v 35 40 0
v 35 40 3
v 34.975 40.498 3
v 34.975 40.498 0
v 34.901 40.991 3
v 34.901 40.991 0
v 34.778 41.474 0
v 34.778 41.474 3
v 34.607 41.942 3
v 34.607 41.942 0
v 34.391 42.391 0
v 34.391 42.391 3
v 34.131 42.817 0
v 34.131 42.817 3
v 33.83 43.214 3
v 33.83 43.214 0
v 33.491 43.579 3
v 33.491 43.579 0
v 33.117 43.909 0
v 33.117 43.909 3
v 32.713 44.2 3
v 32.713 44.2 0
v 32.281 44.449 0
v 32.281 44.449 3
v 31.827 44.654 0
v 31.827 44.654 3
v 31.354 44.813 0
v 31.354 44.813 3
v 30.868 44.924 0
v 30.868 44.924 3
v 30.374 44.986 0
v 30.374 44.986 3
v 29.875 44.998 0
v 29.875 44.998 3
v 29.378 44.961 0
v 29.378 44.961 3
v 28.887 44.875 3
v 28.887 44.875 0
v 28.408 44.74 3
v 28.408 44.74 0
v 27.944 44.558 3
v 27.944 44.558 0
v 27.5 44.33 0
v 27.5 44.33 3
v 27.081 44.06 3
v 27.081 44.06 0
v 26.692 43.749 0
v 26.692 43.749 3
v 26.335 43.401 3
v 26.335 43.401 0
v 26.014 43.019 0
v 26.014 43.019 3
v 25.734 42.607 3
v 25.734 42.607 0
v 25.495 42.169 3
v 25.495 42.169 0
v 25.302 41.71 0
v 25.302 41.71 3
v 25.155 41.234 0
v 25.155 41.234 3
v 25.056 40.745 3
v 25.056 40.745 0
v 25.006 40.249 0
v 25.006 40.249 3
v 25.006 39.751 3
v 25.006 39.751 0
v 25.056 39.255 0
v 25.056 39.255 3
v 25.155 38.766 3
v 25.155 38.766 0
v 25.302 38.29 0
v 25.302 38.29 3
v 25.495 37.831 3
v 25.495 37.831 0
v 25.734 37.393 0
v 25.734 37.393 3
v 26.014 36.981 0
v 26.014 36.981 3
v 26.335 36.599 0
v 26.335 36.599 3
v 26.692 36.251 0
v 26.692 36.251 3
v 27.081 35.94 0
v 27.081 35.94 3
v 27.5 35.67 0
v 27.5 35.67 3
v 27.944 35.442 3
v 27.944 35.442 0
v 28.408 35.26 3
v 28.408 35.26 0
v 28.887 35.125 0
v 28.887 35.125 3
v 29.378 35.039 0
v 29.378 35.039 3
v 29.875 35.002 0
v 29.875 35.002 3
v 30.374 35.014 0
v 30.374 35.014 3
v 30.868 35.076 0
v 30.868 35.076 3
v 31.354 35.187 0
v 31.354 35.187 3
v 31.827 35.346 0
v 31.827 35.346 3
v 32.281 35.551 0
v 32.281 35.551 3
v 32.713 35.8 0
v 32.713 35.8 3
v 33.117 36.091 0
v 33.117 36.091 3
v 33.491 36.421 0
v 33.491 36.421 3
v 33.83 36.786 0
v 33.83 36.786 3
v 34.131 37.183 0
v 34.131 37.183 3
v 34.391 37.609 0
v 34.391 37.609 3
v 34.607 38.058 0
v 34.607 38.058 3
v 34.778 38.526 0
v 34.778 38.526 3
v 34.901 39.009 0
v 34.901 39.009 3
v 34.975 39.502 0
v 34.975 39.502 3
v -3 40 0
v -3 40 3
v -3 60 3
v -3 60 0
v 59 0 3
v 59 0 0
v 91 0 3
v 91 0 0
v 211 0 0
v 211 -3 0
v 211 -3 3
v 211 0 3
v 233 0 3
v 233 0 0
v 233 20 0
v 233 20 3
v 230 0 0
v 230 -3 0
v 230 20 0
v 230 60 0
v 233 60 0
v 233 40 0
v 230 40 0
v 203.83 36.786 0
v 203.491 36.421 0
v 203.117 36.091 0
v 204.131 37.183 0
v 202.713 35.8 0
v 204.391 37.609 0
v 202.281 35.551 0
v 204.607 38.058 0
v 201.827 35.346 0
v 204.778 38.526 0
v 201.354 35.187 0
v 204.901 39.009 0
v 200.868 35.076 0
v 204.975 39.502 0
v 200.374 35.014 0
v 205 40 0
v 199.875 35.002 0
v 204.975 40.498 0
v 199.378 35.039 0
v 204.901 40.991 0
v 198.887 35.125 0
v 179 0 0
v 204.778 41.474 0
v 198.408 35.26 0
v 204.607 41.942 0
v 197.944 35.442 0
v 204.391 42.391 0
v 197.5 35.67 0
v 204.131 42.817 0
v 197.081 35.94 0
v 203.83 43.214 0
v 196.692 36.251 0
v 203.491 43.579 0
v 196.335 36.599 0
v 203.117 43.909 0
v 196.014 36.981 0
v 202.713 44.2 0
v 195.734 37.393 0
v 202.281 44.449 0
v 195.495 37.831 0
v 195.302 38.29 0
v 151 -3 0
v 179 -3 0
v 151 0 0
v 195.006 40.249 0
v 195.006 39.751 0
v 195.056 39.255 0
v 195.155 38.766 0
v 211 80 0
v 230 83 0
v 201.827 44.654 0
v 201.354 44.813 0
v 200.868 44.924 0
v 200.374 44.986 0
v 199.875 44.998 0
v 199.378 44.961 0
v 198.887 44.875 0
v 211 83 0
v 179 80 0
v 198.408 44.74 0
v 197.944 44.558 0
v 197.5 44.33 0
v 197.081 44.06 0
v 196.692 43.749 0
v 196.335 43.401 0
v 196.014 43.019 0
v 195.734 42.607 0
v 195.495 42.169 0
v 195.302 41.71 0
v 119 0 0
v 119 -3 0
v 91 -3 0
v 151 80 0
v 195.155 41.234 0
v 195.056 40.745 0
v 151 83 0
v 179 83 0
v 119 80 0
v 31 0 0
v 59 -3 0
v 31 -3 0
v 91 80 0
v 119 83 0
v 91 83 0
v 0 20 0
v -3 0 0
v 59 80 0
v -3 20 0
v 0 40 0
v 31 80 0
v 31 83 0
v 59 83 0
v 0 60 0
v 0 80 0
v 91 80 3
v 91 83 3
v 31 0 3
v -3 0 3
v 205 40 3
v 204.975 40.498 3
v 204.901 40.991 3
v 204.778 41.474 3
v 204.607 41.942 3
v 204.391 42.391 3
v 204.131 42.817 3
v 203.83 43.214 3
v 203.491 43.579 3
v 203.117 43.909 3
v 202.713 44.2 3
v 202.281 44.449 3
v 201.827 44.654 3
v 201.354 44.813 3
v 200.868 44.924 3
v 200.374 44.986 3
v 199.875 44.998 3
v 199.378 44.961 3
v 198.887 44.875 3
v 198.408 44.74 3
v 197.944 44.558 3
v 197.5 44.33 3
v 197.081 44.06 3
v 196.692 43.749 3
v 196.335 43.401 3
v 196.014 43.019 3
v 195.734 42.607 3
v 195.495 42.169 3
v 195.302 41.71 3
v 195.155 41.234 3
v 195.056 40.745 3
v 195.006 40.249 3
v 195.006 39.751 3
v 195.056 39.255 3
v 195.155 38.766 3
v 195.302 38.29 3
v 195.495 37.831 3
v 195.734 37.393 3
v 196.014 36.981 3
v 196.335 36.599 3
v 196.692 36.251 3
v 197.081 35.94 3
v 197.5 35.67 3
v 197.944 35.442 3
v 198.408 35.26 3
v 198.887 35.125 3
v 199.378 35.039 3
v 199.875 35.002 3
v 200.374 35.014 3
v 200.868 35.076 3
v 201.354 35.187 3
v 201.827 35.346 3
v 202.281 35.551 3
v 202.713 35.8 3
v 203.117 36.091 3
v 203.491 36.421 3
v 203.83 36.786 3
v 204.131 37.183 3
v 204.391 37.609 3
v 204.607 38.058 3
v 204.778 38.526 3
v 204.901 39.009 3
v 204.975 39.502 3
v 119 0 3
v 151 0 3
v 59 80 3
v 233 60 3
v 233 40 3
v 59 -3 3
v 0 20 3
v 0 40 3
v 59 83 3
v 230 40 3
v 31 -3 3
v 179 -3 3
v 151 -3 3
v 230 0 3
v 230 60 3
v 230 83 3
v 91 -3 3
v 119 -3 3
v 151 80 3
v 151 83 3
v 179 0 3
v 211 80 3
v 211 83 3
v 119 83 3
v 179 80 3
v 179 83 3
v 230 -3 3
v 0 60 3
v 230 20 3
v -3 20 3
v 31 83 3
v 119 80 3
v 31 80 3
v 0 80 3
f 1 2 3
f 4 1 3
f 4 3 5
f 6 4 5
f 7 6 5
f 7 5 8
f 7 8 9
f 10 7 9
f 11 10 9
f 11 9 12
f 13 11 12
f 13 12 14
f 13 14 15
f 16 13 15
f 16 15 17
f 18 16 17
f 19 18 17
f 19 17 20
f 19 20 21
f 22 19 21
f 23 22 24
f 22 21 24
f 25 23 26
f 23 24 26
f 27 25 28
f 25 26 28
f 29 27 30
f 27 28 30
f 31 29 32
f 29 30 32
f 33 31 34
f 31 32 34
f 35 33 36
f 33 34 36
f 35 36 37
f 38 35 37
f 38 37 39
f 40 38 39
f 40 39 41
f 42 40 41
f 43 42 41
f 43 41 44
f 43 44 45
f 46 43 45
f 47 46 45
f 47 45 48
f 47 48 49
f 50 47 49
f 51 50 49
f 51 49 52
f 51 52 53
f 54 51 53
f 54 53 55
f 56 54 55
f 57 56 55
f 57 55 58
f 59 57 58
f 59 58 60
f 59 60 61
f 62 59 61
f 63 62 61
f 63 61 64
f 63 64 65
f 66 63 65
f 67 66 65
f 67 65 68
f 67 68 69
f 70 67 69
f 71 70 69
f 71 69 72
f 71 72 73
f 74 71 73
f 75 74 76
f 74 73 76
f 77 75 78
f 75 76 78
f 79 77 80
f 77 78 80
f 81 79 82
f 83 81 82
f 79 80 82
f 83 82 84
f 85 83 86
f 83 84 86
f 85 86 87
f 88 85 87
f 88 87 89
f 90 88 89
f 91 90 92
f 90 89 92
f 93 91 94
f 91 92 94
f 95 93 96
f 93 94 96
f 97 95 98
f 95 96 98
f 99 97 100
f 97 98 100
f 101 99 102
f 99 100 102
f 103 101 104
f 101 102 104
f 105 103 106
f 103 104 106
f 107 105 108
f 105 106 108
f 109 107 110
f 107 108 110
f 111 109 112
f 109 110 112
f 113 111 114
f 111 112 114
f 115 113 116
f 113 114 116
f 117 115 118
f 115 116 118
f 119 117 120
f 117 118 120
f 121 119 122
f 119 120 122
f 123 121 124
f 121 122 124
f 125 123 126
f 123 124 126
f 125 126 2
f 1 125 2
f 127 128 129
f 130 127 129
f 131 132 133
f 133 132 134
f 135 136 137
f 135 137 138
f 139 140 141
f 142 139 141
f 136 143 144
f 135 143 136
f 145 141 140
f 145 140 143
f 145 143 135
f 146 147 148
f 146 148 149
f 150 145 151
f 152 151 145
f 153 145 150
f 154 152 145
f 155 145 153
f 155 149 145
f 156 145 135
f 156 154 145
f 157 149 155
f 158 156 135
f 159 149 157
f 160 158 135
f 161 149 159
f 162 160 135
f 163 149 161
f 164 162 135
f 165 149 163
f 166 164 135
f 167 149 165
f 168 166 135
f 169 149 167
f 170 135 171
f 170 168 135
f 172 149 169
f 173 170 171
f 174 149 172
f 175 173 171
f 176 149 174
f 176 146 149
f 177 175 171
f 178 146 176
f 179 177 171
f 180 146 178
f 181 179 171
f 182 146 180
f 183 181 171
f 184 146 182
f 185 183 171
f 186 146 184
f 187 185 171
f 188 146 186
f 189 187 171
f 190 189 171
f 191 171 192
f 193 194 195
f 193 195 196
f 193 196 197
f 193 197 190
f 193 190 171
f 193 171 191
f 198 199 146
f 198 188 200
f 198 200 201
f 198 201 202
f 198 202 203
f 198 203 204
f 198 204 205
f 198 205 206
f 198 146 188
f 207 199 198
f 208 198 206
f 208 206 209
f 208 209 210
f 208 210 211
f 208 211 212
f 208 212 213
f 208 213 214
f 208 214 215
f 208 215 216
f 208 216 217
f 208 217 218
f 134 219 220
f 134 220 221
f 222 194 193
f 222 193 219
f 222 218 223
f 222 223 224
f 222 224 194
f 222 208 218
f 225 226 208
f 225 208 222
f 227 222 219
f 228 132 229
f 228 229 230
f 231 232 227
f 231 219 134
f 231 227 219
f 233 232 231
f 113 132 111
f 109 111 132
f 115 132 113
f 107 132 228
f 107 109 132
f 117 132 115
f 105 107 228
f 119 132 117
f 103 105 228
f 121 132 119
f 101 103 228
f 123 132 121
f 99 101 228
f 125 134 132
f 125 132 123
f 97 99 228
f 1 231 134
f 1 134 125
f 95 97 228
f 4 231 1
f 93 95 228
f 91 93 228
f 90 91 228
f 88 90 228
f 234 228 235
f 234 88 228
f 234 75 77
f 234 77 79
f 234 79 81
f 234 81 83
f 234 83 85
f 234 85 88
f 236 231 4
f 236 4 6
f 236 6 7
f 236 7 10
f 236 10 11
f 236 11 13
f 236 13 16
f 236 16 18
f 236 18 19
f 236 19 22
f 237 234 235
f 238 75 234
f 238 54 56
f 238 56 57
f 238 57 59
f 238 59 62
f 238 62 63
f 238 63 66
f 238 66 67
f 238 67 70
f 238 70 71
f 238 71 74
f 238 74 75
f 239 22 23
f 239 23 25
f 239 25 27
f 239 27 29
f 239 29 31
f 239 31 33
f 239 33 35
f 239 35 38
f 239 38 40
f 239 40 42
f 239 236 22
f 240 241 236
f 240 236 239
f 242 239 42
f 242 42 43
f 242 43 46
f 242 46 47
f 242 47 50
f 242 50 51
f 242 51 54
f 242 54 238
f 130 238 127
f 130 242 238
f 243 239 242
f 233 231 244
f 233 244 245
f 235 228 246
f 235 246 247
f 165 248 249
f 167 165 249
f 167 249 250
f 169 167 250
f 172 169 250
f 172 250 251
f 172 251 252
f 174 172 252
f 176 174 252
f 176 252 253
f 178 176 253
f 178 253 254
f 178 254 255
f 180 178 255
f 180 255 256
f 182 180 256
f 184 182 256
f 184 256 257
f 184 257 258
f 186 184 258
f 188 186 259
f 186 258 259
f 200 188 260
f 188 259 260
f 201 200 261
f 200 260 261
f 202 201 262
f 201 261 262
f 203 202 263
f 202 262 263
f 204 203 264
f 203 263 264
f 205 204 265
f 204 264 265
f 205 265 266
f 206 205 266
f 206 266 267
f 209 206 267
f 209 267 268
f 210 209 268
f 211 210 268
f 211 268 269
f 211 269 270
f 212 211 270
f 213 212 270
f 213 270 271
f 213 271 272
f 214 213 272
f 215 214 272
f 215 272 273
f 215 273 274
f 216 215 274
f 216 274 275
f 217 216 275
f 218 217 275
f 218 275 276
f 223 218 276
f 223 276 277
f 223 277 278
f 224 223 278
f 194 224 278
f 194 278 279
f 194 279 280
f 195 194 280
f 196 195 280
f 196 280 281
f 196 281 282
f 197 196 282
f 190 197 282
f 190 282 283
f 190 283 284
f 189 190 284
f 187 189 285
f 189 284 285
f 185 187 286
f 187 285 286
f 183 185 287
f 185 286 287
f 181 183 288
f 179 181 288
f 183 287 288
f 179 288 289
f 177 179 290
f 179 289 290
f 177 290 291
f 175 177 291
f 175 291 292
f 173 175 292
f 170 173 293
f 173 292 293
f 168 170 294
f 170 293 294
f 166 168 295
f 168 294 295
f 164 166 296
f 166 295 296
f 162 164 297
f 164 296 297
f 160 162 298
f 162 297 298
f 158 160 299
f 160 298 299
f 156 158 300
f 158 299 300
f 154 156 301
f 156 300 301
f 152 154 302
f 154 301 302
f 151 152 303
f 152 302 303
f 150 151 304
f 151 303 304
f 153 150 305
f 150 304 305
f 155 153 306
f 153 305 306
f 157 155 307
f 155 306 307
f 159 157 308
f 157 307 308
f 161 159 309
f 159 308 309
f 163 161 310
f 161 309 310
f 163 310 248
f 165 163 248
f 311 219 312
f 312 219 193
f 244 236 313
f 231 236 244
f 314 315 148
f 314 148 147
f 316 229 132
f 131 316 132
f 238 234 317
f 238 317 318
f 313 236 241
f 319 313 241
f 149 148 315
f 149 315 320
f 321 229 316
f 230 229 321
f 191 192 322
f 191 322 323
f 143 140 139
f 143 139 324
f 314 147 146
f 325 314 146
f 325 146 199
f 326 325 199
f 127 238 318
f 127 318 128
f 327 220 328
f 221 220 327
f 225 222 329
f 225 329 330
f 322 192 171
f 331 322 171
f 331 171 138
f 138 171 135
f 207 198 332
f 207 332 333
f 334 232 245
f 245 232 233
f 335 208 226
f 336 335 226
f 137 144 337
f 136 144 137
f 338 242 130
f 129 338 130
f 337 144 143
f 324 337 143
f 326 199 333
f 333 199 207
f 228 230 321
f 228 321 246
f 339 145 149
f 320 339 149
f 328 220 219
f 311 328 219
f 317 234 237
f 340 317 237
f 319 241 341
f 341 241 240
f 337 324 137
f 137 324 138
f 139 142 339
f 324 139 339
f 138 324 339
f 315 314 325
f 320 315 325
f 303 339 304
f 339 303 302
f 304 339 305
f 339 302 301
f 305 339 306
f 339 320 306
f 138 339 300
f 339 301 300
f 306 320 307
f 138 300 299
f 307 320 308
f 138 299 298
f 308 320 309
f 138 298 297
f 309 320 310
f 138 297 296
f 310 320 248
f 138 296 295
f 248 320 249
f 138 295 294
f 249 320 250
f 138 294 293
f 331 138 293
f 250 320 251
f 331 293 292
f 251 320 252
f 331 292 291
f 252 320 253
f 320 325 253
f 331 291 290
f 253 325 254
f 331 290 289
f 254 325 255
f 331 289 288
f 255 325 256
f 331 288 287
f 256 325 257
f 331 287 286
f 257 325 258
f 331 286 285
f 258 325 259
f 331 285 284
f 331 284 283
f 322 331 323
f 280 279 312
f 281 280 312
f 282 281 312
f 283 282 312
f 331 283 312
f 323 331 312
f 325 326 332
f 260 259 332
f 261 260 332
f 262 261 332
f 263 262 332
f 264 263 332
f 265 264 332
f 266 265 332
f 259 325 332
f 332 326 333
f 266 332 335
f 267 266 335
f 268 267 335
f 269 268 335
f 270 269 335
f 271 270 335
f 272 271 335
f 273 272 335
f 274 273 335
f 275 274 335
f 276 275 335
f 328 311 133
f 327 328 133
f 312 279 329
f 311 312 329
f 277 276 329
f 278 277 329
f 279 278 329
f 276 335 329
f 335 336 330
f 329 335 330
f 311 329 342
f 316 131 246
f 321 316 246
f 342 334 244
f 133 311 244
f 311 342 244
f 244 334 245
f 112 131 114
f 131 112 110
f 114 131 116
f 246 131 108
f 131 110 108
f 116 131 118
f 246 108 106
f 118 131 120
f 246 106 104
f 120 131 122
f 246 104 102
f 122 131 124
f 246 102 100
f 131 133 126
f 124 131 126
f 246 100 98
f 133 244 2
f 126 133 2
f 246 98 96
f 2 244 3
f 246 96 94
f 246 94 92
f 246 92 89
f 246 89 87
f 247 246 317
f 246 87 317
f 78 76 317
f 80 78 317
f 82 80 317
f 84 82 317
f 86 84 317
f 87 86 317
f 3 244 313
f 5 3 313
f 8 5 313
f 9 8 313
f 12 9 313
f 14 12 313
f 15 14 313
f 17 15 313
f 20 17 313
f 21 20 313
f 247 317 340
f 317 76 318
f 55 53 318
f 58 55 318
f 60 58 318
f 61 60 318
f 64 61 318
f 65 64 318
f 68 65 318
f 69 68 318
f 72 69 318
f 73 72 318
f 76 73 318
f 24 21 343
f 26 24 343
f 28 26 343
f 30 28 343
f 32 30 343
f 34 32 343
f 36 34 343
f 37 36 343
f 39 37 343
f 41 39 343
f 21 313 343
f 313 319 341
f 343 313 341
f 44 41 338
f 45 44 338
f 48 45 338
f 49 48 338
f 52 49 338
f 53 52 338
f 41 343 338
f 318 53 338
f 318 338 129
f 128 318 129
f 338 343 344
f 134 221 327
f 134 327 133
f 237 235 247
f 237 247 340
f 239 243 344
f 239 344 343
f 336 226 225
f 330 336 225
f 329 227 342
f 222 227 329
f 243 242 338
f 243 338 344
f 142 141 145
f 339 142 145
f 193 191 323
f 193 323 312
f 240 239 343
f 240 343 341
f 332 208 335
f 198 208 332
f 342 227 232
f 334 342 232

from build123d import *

# Parameters (mm, degrees)
ESQUISSE2_W             = 230
ESQUISSE2_H             = 80
BOSS_EXTRU_1_DEPTH      = 3
ESQUISSE3_W             = 28
ESQUISSE3_H             = 3
ESQUISSE3_W_2           = 19
BOSS_EXTRU_2_DEPTH      = 3
ESQUISSE5_W             = 5.353052469
ESQUISSE5_H             = 20
ESQUISSE5_W_2           = 7.144707487
BOSS_EXTRU_3_DEPTH      = 3
ENL_V_MAT_EXTRU_2_DEPTH = 10
ESQUISSE8_W             = 2.353052469
ESQUISSE8_H             = 20
ENL_V_MAT_EXTRU_3_DEPTH = 10
ESQUISSE9_R             = 5
ENL_V_MAT_EXTRU_4_DEPTH = 10


with BuildPart() as part:
    # Esquisse2 → Boss.-Extru.1 (new body)
    with BuildSketch(Plane.XY):
        with Locations((115, 40)):
            Rectangle(ESQUISSE2_W, ESQUISSE2_H)
    extrude(amount=BOSS_EXTRU_1_DEPTH)

    # Esquisse3 → Boss.-Extru.2 (add)
    with BuildSketch(Plane(origin=(0, 0, 0), x_dir=(-1, 0, 0), z_dir=(0, 0, -1))):
        with Locations((-45, 81.5)):
            Rectangle(ESQUISSE3_W, ESQUISSE3_H)
        with Locations((-105, 81.5)):
            Rectangle(ESQUISSE3_W, ESQUISSE3_H)
        with Locations((-165, 81.5)):
            Rectangle(ESQUISSE3_W, ESQUISSE3_H)
        with Locations((-220.5, 81.5)):
            Rectangle(ESQUISSE3_W_2, ESQUISSE3_H)
        with Locations((-45, -1.5)):
            Rectangle(ESQUISSE3_W, ESQUISSE3_H)
        with Locations((-105, -1.5)):
            Rectangle(ESQUISSE3_W, ESQUISSE3_H)
        with Locations((-165, -1.5)):
            Rectangle(ESQUISSE3_W, ESQUISSE3_H)
        with Locations((-220.5, -1.5)):
            Rectangle(ESQUISSE3_W_2, ESQUISSE3_H)
    extrude(amount=-BOSS_EXTRU_2_DEPTH)

    # Esquisse5 → Boss.-Extru.3 (add)
    with BuildSketch(Plane(origin=(0, 0, 0), x_dir=(-1, 0, 0), z_dir=(0, 0, -1))):
        with Locations((2.676526235, 10)):
            Rectangle(ESQUISSE5_W, ESQUISSE5_H)
        with Locations((3.572353744, 50)):
            Rectangle(ESQUISSE5_W_2, ESQUISSE5_H)
        with Locations((-232.676526235, 10)):
            Rectangle(ESQUISSE5_W, ESQUISSE5_H)
        with Locations((-233.572353744, 50)):
            Rectangle(ESQUISSE5_W_2, ESQUISSE5_H)
    extrude(amount=-BOSS_EXTRU_3_DEPTH)

    # Esquisse7 → Enlèv. mat.-Extru.2 (cut)
    with BuildSketch(Plane.XY.offset(3)):
        Polygon((237.144707487, 60), (233, 60), (233, 20), (235.353052469, 20), (235.353052469, 0), (233, 0), (233, -1.758999091), (237.903552449, -1.758999091), (237.903552449, 40), (237.144707487, 40), align=None)
        Polygon((-3, 20), (-3, 60), (-7.903552449, 60), (-7.903552449, -1.758999091), (-3, -1.758999091), (-3, 0), (-5.353052469, 0), (-5.353052469, 20), align=None)
    extrude(amount=-ENL_V_MAT_EXTRU_2_DEPTH, mode=Mode.SUBTRACT)

    # Esquisse8 → Enlèv. mat.-Extru.3 (cut)
    with BuildSketch(Plane(origin=(0, 0, 0), x_dir=(-1, 0, 0), z_dir=(0, 0, -1))):
        with Locations((-234.176526235, 10)):
            Rectangle(ESQUISSE8_W, ESQUISSE8_H)
        with Locations((4.176526235, 10)):
            Rectangle(ESQUISSE8_W, ESQUISSE8_H)
    extrude(amount=-ENL_V_MAT_EXTRU_3_DEPTH, mode=Mode.SUBTRACT)

    # Esquisse9 → Enlèv. mat.-Extru.4 (cut)
    with BuildSketch(Plane.XY.offset(3)):
        with Locations((30, 40)):
            Circle(ESQUISSE9_R)
        with Locations((200, 40)):
            Circle(ESQUISSE9_R)
    extrude(amount=-ENL_V_MAT_EXTRU_4_DEPTH, mode=Mode.SUBTRACT)


solid = part.part
